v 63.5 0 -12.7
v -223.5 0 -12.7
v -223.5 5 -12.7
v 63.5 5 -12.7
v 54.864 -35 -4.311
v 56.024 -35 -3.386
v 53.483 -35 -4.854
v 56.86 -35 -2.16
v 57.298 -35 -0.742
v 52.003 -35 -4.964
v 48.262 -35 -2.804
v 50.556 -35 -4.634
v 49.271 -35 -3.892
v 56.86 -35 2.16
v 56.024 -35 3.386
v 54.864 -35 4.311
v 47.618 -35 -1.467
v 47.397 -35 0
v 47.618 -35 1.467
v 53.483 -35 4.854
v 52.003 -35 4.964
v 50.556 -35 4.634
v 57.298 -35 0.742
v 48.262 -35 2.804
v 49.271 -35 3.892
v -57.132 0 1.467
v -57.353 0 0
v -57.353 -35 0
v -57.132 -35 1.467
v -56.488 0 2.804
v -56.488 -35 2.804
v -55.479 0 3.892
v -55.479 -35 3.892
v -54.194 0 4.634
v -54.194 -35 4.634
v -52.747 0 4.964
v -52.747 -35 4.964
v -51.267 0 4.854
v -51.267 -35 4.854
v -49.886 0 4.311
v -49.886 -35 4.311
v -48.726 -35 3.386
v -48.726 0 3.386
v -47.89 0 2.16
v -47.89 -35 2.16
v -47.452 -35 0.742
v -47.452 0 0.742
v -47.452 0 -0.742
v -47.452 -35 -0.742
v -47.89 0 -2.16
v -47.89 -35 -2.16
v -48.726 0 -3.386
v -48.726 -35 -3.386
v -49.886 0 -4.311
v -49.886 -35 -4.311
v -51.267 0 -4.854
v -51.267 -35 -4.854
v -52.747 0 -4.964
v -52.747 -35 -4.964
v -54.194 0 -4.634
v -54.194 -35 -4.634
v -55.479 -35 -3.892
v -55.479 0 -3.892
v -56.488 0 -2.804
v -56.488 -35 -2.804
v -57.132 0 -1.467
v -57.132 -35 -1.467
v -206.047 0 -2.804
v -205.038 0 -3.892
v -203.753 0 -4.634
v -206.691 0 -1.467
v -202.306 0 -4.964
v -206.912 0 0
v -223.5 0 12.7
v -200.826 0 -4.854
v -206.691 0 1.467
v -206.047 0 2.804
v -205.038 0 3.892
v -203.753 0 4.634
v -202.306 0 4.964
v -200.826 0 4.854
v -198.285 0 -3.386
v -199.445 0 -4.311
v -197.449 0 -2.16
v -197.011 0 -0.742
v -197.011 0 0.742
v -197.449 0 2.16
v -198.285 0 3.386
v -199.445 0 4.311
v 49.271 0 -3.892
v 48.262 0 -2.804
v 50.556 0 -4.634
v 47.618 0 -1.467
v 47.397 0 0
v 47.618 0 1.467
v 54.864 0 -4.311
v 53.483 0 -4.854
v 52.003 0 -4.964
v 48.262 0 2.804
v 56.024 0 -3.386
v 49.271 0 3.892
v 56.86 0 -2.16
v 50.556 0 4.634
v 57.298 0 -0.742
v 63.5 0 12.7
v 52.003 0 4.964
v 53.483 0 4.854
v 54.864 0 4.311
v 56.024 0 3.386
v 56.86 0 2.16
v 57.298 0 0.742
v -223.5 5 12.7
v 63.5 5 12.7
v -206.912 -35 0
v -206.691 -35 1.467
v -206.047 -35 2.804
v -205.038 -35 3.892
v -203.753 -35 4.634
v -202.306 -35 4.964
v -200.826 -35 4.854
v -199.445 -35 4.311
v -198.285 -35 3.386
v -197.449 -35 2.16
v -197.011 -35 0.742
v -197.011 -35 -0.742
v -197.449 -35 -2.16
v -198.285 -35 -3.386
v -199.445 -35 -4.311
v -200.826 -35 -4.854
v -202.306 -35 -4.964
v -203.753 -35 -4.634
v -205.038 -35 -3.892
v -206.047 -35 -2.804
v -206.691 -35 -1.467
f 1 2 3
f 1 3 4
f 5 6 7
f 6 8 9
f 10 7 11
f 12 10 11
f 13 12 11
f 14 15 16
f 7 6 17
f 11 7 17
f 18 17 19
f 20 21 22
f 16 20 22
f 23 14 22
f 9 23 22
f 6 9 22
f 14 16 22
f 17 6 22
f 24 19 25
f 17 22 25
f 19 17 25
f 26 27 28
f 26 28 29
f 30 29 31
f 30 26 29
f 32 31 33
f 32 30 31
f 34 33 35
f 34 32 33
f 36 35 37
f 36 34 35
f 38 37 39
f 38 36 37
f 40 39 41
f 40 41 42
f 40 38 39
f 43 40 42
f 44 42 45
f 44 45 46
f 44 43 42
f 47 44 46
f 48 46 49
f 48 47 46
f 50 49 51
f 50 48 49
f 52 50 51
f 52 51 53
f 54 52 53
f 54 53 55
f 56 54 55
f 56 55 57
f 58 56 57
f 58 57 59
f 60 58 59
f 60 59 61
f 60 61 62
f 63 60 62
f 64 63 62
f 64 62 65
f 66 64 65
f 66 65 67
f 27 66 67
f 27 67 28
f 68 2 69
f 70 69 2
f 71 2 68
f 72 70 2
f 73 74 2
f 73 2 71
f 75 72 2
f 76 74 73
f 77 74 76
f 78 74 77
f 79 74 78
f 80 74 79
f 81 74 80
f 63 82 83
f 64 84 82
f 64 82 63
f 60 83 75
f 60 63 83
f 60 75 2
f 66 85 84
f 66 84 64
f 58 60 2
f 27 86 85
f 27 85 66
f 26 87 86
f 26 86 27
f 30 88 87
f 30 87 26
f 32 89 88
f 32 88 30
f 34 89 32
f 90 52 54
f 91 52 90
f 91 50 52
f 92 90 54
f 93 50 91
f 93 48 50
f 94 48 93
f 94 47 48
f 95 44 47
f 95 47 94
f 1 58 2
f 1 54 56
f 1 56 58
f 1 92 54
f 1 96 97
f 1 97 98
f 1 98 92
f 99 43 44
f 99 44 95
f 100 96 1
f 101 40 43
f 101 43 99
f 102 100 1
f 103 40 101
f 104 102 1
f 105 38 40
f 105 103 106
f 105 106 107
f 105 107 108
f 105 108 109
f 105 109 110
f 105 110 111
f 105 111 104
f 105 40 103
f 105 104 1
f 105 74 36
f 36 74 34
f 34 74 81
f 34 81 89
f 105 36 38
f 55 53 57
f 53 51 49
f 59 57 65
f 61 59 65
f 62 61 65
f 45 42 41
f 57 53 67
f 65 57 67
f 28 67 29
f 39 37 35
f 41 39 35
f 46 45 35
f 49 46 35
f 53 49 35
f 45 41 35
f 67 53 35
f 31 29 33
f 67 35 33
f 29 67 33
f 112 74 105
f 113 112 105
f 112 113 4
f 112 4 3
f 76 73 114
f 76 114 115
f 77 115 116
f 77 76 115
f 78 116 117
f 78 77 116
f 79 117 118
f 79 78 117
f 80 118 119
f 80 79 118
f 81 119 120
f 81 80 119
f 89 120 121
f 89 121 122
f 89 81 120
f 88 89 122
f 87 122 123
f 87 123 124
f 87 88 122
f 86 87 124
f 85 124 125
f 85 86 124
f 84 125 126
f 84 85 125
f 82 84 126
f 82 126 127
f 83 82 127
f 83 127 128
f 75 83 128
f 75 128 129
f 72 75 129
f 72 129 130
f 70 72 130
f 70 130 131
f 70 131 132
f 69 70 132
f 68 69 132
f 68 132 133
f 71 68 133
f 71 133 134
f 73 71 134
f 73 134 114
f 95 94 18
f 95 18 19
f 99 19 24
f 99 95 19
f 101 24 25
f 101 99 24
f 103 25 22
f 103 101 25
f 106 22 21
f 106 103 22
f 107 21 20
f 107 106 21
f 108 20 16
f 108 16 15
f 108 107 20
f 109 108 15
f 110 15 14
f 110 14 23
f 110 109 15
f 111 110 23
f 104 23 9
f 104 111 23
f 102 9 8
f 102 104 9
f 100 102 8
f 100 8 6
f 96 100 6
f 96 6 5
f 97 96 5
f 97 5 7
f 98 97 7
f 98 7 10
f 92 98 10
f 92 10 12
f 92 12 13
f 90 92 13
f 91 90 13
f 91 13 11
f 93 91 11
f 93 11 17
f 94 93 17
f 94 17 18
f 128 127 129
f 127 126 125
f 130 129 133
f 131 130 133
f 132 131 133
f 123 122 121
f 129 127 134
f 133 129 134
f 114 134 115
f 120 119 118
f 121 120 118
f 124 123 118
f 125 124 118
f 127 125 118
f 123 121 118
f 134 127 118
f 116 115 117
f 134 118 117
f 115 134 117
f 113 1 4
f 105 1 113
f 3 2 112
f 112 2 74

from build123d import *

# Parameters (mm, degrees)
F0_W     = 127
F0_H     = 25.4
F1_DEPTH = 5
F2_W     = 160
F2_H     = 25.4
F3_DEPTH = 5
F4_R     = 4.9784
F5_DEPTH = 40


with BuildPart() as f1:
    # F0 (on Front) → F1 (new body)
    with BuildSketch(Plane.XZ):
        Rectangle(F0_W, F0_H)
    extrude(amount=-F1_DEPTH)

    # F2 (on Front) → F3 (join, through all)
    with BuildSketch(Plane.XZ):
        with Locations((-143.5, 0)):
            Rectangle(F2_W, F2_H)
    extrude(amount=-F3_DEPTH)

    # F4 (on face) → F5 (join)
    with BuildSketch(Plane(origin=(0, 5, 0), x_dir=(-1, 0, 0), z_dir=(0, 1, 0))):
        with Locations((-52.375, 0)):
            Circle(F4_R)
        with Locations((52.375, 0)):
            Circle(F4_R)
        with Locations((201.934084, 0)):
            Circle(F4_R)
    extrude(amount=-F5_DEPTH)


solid = f1.part
